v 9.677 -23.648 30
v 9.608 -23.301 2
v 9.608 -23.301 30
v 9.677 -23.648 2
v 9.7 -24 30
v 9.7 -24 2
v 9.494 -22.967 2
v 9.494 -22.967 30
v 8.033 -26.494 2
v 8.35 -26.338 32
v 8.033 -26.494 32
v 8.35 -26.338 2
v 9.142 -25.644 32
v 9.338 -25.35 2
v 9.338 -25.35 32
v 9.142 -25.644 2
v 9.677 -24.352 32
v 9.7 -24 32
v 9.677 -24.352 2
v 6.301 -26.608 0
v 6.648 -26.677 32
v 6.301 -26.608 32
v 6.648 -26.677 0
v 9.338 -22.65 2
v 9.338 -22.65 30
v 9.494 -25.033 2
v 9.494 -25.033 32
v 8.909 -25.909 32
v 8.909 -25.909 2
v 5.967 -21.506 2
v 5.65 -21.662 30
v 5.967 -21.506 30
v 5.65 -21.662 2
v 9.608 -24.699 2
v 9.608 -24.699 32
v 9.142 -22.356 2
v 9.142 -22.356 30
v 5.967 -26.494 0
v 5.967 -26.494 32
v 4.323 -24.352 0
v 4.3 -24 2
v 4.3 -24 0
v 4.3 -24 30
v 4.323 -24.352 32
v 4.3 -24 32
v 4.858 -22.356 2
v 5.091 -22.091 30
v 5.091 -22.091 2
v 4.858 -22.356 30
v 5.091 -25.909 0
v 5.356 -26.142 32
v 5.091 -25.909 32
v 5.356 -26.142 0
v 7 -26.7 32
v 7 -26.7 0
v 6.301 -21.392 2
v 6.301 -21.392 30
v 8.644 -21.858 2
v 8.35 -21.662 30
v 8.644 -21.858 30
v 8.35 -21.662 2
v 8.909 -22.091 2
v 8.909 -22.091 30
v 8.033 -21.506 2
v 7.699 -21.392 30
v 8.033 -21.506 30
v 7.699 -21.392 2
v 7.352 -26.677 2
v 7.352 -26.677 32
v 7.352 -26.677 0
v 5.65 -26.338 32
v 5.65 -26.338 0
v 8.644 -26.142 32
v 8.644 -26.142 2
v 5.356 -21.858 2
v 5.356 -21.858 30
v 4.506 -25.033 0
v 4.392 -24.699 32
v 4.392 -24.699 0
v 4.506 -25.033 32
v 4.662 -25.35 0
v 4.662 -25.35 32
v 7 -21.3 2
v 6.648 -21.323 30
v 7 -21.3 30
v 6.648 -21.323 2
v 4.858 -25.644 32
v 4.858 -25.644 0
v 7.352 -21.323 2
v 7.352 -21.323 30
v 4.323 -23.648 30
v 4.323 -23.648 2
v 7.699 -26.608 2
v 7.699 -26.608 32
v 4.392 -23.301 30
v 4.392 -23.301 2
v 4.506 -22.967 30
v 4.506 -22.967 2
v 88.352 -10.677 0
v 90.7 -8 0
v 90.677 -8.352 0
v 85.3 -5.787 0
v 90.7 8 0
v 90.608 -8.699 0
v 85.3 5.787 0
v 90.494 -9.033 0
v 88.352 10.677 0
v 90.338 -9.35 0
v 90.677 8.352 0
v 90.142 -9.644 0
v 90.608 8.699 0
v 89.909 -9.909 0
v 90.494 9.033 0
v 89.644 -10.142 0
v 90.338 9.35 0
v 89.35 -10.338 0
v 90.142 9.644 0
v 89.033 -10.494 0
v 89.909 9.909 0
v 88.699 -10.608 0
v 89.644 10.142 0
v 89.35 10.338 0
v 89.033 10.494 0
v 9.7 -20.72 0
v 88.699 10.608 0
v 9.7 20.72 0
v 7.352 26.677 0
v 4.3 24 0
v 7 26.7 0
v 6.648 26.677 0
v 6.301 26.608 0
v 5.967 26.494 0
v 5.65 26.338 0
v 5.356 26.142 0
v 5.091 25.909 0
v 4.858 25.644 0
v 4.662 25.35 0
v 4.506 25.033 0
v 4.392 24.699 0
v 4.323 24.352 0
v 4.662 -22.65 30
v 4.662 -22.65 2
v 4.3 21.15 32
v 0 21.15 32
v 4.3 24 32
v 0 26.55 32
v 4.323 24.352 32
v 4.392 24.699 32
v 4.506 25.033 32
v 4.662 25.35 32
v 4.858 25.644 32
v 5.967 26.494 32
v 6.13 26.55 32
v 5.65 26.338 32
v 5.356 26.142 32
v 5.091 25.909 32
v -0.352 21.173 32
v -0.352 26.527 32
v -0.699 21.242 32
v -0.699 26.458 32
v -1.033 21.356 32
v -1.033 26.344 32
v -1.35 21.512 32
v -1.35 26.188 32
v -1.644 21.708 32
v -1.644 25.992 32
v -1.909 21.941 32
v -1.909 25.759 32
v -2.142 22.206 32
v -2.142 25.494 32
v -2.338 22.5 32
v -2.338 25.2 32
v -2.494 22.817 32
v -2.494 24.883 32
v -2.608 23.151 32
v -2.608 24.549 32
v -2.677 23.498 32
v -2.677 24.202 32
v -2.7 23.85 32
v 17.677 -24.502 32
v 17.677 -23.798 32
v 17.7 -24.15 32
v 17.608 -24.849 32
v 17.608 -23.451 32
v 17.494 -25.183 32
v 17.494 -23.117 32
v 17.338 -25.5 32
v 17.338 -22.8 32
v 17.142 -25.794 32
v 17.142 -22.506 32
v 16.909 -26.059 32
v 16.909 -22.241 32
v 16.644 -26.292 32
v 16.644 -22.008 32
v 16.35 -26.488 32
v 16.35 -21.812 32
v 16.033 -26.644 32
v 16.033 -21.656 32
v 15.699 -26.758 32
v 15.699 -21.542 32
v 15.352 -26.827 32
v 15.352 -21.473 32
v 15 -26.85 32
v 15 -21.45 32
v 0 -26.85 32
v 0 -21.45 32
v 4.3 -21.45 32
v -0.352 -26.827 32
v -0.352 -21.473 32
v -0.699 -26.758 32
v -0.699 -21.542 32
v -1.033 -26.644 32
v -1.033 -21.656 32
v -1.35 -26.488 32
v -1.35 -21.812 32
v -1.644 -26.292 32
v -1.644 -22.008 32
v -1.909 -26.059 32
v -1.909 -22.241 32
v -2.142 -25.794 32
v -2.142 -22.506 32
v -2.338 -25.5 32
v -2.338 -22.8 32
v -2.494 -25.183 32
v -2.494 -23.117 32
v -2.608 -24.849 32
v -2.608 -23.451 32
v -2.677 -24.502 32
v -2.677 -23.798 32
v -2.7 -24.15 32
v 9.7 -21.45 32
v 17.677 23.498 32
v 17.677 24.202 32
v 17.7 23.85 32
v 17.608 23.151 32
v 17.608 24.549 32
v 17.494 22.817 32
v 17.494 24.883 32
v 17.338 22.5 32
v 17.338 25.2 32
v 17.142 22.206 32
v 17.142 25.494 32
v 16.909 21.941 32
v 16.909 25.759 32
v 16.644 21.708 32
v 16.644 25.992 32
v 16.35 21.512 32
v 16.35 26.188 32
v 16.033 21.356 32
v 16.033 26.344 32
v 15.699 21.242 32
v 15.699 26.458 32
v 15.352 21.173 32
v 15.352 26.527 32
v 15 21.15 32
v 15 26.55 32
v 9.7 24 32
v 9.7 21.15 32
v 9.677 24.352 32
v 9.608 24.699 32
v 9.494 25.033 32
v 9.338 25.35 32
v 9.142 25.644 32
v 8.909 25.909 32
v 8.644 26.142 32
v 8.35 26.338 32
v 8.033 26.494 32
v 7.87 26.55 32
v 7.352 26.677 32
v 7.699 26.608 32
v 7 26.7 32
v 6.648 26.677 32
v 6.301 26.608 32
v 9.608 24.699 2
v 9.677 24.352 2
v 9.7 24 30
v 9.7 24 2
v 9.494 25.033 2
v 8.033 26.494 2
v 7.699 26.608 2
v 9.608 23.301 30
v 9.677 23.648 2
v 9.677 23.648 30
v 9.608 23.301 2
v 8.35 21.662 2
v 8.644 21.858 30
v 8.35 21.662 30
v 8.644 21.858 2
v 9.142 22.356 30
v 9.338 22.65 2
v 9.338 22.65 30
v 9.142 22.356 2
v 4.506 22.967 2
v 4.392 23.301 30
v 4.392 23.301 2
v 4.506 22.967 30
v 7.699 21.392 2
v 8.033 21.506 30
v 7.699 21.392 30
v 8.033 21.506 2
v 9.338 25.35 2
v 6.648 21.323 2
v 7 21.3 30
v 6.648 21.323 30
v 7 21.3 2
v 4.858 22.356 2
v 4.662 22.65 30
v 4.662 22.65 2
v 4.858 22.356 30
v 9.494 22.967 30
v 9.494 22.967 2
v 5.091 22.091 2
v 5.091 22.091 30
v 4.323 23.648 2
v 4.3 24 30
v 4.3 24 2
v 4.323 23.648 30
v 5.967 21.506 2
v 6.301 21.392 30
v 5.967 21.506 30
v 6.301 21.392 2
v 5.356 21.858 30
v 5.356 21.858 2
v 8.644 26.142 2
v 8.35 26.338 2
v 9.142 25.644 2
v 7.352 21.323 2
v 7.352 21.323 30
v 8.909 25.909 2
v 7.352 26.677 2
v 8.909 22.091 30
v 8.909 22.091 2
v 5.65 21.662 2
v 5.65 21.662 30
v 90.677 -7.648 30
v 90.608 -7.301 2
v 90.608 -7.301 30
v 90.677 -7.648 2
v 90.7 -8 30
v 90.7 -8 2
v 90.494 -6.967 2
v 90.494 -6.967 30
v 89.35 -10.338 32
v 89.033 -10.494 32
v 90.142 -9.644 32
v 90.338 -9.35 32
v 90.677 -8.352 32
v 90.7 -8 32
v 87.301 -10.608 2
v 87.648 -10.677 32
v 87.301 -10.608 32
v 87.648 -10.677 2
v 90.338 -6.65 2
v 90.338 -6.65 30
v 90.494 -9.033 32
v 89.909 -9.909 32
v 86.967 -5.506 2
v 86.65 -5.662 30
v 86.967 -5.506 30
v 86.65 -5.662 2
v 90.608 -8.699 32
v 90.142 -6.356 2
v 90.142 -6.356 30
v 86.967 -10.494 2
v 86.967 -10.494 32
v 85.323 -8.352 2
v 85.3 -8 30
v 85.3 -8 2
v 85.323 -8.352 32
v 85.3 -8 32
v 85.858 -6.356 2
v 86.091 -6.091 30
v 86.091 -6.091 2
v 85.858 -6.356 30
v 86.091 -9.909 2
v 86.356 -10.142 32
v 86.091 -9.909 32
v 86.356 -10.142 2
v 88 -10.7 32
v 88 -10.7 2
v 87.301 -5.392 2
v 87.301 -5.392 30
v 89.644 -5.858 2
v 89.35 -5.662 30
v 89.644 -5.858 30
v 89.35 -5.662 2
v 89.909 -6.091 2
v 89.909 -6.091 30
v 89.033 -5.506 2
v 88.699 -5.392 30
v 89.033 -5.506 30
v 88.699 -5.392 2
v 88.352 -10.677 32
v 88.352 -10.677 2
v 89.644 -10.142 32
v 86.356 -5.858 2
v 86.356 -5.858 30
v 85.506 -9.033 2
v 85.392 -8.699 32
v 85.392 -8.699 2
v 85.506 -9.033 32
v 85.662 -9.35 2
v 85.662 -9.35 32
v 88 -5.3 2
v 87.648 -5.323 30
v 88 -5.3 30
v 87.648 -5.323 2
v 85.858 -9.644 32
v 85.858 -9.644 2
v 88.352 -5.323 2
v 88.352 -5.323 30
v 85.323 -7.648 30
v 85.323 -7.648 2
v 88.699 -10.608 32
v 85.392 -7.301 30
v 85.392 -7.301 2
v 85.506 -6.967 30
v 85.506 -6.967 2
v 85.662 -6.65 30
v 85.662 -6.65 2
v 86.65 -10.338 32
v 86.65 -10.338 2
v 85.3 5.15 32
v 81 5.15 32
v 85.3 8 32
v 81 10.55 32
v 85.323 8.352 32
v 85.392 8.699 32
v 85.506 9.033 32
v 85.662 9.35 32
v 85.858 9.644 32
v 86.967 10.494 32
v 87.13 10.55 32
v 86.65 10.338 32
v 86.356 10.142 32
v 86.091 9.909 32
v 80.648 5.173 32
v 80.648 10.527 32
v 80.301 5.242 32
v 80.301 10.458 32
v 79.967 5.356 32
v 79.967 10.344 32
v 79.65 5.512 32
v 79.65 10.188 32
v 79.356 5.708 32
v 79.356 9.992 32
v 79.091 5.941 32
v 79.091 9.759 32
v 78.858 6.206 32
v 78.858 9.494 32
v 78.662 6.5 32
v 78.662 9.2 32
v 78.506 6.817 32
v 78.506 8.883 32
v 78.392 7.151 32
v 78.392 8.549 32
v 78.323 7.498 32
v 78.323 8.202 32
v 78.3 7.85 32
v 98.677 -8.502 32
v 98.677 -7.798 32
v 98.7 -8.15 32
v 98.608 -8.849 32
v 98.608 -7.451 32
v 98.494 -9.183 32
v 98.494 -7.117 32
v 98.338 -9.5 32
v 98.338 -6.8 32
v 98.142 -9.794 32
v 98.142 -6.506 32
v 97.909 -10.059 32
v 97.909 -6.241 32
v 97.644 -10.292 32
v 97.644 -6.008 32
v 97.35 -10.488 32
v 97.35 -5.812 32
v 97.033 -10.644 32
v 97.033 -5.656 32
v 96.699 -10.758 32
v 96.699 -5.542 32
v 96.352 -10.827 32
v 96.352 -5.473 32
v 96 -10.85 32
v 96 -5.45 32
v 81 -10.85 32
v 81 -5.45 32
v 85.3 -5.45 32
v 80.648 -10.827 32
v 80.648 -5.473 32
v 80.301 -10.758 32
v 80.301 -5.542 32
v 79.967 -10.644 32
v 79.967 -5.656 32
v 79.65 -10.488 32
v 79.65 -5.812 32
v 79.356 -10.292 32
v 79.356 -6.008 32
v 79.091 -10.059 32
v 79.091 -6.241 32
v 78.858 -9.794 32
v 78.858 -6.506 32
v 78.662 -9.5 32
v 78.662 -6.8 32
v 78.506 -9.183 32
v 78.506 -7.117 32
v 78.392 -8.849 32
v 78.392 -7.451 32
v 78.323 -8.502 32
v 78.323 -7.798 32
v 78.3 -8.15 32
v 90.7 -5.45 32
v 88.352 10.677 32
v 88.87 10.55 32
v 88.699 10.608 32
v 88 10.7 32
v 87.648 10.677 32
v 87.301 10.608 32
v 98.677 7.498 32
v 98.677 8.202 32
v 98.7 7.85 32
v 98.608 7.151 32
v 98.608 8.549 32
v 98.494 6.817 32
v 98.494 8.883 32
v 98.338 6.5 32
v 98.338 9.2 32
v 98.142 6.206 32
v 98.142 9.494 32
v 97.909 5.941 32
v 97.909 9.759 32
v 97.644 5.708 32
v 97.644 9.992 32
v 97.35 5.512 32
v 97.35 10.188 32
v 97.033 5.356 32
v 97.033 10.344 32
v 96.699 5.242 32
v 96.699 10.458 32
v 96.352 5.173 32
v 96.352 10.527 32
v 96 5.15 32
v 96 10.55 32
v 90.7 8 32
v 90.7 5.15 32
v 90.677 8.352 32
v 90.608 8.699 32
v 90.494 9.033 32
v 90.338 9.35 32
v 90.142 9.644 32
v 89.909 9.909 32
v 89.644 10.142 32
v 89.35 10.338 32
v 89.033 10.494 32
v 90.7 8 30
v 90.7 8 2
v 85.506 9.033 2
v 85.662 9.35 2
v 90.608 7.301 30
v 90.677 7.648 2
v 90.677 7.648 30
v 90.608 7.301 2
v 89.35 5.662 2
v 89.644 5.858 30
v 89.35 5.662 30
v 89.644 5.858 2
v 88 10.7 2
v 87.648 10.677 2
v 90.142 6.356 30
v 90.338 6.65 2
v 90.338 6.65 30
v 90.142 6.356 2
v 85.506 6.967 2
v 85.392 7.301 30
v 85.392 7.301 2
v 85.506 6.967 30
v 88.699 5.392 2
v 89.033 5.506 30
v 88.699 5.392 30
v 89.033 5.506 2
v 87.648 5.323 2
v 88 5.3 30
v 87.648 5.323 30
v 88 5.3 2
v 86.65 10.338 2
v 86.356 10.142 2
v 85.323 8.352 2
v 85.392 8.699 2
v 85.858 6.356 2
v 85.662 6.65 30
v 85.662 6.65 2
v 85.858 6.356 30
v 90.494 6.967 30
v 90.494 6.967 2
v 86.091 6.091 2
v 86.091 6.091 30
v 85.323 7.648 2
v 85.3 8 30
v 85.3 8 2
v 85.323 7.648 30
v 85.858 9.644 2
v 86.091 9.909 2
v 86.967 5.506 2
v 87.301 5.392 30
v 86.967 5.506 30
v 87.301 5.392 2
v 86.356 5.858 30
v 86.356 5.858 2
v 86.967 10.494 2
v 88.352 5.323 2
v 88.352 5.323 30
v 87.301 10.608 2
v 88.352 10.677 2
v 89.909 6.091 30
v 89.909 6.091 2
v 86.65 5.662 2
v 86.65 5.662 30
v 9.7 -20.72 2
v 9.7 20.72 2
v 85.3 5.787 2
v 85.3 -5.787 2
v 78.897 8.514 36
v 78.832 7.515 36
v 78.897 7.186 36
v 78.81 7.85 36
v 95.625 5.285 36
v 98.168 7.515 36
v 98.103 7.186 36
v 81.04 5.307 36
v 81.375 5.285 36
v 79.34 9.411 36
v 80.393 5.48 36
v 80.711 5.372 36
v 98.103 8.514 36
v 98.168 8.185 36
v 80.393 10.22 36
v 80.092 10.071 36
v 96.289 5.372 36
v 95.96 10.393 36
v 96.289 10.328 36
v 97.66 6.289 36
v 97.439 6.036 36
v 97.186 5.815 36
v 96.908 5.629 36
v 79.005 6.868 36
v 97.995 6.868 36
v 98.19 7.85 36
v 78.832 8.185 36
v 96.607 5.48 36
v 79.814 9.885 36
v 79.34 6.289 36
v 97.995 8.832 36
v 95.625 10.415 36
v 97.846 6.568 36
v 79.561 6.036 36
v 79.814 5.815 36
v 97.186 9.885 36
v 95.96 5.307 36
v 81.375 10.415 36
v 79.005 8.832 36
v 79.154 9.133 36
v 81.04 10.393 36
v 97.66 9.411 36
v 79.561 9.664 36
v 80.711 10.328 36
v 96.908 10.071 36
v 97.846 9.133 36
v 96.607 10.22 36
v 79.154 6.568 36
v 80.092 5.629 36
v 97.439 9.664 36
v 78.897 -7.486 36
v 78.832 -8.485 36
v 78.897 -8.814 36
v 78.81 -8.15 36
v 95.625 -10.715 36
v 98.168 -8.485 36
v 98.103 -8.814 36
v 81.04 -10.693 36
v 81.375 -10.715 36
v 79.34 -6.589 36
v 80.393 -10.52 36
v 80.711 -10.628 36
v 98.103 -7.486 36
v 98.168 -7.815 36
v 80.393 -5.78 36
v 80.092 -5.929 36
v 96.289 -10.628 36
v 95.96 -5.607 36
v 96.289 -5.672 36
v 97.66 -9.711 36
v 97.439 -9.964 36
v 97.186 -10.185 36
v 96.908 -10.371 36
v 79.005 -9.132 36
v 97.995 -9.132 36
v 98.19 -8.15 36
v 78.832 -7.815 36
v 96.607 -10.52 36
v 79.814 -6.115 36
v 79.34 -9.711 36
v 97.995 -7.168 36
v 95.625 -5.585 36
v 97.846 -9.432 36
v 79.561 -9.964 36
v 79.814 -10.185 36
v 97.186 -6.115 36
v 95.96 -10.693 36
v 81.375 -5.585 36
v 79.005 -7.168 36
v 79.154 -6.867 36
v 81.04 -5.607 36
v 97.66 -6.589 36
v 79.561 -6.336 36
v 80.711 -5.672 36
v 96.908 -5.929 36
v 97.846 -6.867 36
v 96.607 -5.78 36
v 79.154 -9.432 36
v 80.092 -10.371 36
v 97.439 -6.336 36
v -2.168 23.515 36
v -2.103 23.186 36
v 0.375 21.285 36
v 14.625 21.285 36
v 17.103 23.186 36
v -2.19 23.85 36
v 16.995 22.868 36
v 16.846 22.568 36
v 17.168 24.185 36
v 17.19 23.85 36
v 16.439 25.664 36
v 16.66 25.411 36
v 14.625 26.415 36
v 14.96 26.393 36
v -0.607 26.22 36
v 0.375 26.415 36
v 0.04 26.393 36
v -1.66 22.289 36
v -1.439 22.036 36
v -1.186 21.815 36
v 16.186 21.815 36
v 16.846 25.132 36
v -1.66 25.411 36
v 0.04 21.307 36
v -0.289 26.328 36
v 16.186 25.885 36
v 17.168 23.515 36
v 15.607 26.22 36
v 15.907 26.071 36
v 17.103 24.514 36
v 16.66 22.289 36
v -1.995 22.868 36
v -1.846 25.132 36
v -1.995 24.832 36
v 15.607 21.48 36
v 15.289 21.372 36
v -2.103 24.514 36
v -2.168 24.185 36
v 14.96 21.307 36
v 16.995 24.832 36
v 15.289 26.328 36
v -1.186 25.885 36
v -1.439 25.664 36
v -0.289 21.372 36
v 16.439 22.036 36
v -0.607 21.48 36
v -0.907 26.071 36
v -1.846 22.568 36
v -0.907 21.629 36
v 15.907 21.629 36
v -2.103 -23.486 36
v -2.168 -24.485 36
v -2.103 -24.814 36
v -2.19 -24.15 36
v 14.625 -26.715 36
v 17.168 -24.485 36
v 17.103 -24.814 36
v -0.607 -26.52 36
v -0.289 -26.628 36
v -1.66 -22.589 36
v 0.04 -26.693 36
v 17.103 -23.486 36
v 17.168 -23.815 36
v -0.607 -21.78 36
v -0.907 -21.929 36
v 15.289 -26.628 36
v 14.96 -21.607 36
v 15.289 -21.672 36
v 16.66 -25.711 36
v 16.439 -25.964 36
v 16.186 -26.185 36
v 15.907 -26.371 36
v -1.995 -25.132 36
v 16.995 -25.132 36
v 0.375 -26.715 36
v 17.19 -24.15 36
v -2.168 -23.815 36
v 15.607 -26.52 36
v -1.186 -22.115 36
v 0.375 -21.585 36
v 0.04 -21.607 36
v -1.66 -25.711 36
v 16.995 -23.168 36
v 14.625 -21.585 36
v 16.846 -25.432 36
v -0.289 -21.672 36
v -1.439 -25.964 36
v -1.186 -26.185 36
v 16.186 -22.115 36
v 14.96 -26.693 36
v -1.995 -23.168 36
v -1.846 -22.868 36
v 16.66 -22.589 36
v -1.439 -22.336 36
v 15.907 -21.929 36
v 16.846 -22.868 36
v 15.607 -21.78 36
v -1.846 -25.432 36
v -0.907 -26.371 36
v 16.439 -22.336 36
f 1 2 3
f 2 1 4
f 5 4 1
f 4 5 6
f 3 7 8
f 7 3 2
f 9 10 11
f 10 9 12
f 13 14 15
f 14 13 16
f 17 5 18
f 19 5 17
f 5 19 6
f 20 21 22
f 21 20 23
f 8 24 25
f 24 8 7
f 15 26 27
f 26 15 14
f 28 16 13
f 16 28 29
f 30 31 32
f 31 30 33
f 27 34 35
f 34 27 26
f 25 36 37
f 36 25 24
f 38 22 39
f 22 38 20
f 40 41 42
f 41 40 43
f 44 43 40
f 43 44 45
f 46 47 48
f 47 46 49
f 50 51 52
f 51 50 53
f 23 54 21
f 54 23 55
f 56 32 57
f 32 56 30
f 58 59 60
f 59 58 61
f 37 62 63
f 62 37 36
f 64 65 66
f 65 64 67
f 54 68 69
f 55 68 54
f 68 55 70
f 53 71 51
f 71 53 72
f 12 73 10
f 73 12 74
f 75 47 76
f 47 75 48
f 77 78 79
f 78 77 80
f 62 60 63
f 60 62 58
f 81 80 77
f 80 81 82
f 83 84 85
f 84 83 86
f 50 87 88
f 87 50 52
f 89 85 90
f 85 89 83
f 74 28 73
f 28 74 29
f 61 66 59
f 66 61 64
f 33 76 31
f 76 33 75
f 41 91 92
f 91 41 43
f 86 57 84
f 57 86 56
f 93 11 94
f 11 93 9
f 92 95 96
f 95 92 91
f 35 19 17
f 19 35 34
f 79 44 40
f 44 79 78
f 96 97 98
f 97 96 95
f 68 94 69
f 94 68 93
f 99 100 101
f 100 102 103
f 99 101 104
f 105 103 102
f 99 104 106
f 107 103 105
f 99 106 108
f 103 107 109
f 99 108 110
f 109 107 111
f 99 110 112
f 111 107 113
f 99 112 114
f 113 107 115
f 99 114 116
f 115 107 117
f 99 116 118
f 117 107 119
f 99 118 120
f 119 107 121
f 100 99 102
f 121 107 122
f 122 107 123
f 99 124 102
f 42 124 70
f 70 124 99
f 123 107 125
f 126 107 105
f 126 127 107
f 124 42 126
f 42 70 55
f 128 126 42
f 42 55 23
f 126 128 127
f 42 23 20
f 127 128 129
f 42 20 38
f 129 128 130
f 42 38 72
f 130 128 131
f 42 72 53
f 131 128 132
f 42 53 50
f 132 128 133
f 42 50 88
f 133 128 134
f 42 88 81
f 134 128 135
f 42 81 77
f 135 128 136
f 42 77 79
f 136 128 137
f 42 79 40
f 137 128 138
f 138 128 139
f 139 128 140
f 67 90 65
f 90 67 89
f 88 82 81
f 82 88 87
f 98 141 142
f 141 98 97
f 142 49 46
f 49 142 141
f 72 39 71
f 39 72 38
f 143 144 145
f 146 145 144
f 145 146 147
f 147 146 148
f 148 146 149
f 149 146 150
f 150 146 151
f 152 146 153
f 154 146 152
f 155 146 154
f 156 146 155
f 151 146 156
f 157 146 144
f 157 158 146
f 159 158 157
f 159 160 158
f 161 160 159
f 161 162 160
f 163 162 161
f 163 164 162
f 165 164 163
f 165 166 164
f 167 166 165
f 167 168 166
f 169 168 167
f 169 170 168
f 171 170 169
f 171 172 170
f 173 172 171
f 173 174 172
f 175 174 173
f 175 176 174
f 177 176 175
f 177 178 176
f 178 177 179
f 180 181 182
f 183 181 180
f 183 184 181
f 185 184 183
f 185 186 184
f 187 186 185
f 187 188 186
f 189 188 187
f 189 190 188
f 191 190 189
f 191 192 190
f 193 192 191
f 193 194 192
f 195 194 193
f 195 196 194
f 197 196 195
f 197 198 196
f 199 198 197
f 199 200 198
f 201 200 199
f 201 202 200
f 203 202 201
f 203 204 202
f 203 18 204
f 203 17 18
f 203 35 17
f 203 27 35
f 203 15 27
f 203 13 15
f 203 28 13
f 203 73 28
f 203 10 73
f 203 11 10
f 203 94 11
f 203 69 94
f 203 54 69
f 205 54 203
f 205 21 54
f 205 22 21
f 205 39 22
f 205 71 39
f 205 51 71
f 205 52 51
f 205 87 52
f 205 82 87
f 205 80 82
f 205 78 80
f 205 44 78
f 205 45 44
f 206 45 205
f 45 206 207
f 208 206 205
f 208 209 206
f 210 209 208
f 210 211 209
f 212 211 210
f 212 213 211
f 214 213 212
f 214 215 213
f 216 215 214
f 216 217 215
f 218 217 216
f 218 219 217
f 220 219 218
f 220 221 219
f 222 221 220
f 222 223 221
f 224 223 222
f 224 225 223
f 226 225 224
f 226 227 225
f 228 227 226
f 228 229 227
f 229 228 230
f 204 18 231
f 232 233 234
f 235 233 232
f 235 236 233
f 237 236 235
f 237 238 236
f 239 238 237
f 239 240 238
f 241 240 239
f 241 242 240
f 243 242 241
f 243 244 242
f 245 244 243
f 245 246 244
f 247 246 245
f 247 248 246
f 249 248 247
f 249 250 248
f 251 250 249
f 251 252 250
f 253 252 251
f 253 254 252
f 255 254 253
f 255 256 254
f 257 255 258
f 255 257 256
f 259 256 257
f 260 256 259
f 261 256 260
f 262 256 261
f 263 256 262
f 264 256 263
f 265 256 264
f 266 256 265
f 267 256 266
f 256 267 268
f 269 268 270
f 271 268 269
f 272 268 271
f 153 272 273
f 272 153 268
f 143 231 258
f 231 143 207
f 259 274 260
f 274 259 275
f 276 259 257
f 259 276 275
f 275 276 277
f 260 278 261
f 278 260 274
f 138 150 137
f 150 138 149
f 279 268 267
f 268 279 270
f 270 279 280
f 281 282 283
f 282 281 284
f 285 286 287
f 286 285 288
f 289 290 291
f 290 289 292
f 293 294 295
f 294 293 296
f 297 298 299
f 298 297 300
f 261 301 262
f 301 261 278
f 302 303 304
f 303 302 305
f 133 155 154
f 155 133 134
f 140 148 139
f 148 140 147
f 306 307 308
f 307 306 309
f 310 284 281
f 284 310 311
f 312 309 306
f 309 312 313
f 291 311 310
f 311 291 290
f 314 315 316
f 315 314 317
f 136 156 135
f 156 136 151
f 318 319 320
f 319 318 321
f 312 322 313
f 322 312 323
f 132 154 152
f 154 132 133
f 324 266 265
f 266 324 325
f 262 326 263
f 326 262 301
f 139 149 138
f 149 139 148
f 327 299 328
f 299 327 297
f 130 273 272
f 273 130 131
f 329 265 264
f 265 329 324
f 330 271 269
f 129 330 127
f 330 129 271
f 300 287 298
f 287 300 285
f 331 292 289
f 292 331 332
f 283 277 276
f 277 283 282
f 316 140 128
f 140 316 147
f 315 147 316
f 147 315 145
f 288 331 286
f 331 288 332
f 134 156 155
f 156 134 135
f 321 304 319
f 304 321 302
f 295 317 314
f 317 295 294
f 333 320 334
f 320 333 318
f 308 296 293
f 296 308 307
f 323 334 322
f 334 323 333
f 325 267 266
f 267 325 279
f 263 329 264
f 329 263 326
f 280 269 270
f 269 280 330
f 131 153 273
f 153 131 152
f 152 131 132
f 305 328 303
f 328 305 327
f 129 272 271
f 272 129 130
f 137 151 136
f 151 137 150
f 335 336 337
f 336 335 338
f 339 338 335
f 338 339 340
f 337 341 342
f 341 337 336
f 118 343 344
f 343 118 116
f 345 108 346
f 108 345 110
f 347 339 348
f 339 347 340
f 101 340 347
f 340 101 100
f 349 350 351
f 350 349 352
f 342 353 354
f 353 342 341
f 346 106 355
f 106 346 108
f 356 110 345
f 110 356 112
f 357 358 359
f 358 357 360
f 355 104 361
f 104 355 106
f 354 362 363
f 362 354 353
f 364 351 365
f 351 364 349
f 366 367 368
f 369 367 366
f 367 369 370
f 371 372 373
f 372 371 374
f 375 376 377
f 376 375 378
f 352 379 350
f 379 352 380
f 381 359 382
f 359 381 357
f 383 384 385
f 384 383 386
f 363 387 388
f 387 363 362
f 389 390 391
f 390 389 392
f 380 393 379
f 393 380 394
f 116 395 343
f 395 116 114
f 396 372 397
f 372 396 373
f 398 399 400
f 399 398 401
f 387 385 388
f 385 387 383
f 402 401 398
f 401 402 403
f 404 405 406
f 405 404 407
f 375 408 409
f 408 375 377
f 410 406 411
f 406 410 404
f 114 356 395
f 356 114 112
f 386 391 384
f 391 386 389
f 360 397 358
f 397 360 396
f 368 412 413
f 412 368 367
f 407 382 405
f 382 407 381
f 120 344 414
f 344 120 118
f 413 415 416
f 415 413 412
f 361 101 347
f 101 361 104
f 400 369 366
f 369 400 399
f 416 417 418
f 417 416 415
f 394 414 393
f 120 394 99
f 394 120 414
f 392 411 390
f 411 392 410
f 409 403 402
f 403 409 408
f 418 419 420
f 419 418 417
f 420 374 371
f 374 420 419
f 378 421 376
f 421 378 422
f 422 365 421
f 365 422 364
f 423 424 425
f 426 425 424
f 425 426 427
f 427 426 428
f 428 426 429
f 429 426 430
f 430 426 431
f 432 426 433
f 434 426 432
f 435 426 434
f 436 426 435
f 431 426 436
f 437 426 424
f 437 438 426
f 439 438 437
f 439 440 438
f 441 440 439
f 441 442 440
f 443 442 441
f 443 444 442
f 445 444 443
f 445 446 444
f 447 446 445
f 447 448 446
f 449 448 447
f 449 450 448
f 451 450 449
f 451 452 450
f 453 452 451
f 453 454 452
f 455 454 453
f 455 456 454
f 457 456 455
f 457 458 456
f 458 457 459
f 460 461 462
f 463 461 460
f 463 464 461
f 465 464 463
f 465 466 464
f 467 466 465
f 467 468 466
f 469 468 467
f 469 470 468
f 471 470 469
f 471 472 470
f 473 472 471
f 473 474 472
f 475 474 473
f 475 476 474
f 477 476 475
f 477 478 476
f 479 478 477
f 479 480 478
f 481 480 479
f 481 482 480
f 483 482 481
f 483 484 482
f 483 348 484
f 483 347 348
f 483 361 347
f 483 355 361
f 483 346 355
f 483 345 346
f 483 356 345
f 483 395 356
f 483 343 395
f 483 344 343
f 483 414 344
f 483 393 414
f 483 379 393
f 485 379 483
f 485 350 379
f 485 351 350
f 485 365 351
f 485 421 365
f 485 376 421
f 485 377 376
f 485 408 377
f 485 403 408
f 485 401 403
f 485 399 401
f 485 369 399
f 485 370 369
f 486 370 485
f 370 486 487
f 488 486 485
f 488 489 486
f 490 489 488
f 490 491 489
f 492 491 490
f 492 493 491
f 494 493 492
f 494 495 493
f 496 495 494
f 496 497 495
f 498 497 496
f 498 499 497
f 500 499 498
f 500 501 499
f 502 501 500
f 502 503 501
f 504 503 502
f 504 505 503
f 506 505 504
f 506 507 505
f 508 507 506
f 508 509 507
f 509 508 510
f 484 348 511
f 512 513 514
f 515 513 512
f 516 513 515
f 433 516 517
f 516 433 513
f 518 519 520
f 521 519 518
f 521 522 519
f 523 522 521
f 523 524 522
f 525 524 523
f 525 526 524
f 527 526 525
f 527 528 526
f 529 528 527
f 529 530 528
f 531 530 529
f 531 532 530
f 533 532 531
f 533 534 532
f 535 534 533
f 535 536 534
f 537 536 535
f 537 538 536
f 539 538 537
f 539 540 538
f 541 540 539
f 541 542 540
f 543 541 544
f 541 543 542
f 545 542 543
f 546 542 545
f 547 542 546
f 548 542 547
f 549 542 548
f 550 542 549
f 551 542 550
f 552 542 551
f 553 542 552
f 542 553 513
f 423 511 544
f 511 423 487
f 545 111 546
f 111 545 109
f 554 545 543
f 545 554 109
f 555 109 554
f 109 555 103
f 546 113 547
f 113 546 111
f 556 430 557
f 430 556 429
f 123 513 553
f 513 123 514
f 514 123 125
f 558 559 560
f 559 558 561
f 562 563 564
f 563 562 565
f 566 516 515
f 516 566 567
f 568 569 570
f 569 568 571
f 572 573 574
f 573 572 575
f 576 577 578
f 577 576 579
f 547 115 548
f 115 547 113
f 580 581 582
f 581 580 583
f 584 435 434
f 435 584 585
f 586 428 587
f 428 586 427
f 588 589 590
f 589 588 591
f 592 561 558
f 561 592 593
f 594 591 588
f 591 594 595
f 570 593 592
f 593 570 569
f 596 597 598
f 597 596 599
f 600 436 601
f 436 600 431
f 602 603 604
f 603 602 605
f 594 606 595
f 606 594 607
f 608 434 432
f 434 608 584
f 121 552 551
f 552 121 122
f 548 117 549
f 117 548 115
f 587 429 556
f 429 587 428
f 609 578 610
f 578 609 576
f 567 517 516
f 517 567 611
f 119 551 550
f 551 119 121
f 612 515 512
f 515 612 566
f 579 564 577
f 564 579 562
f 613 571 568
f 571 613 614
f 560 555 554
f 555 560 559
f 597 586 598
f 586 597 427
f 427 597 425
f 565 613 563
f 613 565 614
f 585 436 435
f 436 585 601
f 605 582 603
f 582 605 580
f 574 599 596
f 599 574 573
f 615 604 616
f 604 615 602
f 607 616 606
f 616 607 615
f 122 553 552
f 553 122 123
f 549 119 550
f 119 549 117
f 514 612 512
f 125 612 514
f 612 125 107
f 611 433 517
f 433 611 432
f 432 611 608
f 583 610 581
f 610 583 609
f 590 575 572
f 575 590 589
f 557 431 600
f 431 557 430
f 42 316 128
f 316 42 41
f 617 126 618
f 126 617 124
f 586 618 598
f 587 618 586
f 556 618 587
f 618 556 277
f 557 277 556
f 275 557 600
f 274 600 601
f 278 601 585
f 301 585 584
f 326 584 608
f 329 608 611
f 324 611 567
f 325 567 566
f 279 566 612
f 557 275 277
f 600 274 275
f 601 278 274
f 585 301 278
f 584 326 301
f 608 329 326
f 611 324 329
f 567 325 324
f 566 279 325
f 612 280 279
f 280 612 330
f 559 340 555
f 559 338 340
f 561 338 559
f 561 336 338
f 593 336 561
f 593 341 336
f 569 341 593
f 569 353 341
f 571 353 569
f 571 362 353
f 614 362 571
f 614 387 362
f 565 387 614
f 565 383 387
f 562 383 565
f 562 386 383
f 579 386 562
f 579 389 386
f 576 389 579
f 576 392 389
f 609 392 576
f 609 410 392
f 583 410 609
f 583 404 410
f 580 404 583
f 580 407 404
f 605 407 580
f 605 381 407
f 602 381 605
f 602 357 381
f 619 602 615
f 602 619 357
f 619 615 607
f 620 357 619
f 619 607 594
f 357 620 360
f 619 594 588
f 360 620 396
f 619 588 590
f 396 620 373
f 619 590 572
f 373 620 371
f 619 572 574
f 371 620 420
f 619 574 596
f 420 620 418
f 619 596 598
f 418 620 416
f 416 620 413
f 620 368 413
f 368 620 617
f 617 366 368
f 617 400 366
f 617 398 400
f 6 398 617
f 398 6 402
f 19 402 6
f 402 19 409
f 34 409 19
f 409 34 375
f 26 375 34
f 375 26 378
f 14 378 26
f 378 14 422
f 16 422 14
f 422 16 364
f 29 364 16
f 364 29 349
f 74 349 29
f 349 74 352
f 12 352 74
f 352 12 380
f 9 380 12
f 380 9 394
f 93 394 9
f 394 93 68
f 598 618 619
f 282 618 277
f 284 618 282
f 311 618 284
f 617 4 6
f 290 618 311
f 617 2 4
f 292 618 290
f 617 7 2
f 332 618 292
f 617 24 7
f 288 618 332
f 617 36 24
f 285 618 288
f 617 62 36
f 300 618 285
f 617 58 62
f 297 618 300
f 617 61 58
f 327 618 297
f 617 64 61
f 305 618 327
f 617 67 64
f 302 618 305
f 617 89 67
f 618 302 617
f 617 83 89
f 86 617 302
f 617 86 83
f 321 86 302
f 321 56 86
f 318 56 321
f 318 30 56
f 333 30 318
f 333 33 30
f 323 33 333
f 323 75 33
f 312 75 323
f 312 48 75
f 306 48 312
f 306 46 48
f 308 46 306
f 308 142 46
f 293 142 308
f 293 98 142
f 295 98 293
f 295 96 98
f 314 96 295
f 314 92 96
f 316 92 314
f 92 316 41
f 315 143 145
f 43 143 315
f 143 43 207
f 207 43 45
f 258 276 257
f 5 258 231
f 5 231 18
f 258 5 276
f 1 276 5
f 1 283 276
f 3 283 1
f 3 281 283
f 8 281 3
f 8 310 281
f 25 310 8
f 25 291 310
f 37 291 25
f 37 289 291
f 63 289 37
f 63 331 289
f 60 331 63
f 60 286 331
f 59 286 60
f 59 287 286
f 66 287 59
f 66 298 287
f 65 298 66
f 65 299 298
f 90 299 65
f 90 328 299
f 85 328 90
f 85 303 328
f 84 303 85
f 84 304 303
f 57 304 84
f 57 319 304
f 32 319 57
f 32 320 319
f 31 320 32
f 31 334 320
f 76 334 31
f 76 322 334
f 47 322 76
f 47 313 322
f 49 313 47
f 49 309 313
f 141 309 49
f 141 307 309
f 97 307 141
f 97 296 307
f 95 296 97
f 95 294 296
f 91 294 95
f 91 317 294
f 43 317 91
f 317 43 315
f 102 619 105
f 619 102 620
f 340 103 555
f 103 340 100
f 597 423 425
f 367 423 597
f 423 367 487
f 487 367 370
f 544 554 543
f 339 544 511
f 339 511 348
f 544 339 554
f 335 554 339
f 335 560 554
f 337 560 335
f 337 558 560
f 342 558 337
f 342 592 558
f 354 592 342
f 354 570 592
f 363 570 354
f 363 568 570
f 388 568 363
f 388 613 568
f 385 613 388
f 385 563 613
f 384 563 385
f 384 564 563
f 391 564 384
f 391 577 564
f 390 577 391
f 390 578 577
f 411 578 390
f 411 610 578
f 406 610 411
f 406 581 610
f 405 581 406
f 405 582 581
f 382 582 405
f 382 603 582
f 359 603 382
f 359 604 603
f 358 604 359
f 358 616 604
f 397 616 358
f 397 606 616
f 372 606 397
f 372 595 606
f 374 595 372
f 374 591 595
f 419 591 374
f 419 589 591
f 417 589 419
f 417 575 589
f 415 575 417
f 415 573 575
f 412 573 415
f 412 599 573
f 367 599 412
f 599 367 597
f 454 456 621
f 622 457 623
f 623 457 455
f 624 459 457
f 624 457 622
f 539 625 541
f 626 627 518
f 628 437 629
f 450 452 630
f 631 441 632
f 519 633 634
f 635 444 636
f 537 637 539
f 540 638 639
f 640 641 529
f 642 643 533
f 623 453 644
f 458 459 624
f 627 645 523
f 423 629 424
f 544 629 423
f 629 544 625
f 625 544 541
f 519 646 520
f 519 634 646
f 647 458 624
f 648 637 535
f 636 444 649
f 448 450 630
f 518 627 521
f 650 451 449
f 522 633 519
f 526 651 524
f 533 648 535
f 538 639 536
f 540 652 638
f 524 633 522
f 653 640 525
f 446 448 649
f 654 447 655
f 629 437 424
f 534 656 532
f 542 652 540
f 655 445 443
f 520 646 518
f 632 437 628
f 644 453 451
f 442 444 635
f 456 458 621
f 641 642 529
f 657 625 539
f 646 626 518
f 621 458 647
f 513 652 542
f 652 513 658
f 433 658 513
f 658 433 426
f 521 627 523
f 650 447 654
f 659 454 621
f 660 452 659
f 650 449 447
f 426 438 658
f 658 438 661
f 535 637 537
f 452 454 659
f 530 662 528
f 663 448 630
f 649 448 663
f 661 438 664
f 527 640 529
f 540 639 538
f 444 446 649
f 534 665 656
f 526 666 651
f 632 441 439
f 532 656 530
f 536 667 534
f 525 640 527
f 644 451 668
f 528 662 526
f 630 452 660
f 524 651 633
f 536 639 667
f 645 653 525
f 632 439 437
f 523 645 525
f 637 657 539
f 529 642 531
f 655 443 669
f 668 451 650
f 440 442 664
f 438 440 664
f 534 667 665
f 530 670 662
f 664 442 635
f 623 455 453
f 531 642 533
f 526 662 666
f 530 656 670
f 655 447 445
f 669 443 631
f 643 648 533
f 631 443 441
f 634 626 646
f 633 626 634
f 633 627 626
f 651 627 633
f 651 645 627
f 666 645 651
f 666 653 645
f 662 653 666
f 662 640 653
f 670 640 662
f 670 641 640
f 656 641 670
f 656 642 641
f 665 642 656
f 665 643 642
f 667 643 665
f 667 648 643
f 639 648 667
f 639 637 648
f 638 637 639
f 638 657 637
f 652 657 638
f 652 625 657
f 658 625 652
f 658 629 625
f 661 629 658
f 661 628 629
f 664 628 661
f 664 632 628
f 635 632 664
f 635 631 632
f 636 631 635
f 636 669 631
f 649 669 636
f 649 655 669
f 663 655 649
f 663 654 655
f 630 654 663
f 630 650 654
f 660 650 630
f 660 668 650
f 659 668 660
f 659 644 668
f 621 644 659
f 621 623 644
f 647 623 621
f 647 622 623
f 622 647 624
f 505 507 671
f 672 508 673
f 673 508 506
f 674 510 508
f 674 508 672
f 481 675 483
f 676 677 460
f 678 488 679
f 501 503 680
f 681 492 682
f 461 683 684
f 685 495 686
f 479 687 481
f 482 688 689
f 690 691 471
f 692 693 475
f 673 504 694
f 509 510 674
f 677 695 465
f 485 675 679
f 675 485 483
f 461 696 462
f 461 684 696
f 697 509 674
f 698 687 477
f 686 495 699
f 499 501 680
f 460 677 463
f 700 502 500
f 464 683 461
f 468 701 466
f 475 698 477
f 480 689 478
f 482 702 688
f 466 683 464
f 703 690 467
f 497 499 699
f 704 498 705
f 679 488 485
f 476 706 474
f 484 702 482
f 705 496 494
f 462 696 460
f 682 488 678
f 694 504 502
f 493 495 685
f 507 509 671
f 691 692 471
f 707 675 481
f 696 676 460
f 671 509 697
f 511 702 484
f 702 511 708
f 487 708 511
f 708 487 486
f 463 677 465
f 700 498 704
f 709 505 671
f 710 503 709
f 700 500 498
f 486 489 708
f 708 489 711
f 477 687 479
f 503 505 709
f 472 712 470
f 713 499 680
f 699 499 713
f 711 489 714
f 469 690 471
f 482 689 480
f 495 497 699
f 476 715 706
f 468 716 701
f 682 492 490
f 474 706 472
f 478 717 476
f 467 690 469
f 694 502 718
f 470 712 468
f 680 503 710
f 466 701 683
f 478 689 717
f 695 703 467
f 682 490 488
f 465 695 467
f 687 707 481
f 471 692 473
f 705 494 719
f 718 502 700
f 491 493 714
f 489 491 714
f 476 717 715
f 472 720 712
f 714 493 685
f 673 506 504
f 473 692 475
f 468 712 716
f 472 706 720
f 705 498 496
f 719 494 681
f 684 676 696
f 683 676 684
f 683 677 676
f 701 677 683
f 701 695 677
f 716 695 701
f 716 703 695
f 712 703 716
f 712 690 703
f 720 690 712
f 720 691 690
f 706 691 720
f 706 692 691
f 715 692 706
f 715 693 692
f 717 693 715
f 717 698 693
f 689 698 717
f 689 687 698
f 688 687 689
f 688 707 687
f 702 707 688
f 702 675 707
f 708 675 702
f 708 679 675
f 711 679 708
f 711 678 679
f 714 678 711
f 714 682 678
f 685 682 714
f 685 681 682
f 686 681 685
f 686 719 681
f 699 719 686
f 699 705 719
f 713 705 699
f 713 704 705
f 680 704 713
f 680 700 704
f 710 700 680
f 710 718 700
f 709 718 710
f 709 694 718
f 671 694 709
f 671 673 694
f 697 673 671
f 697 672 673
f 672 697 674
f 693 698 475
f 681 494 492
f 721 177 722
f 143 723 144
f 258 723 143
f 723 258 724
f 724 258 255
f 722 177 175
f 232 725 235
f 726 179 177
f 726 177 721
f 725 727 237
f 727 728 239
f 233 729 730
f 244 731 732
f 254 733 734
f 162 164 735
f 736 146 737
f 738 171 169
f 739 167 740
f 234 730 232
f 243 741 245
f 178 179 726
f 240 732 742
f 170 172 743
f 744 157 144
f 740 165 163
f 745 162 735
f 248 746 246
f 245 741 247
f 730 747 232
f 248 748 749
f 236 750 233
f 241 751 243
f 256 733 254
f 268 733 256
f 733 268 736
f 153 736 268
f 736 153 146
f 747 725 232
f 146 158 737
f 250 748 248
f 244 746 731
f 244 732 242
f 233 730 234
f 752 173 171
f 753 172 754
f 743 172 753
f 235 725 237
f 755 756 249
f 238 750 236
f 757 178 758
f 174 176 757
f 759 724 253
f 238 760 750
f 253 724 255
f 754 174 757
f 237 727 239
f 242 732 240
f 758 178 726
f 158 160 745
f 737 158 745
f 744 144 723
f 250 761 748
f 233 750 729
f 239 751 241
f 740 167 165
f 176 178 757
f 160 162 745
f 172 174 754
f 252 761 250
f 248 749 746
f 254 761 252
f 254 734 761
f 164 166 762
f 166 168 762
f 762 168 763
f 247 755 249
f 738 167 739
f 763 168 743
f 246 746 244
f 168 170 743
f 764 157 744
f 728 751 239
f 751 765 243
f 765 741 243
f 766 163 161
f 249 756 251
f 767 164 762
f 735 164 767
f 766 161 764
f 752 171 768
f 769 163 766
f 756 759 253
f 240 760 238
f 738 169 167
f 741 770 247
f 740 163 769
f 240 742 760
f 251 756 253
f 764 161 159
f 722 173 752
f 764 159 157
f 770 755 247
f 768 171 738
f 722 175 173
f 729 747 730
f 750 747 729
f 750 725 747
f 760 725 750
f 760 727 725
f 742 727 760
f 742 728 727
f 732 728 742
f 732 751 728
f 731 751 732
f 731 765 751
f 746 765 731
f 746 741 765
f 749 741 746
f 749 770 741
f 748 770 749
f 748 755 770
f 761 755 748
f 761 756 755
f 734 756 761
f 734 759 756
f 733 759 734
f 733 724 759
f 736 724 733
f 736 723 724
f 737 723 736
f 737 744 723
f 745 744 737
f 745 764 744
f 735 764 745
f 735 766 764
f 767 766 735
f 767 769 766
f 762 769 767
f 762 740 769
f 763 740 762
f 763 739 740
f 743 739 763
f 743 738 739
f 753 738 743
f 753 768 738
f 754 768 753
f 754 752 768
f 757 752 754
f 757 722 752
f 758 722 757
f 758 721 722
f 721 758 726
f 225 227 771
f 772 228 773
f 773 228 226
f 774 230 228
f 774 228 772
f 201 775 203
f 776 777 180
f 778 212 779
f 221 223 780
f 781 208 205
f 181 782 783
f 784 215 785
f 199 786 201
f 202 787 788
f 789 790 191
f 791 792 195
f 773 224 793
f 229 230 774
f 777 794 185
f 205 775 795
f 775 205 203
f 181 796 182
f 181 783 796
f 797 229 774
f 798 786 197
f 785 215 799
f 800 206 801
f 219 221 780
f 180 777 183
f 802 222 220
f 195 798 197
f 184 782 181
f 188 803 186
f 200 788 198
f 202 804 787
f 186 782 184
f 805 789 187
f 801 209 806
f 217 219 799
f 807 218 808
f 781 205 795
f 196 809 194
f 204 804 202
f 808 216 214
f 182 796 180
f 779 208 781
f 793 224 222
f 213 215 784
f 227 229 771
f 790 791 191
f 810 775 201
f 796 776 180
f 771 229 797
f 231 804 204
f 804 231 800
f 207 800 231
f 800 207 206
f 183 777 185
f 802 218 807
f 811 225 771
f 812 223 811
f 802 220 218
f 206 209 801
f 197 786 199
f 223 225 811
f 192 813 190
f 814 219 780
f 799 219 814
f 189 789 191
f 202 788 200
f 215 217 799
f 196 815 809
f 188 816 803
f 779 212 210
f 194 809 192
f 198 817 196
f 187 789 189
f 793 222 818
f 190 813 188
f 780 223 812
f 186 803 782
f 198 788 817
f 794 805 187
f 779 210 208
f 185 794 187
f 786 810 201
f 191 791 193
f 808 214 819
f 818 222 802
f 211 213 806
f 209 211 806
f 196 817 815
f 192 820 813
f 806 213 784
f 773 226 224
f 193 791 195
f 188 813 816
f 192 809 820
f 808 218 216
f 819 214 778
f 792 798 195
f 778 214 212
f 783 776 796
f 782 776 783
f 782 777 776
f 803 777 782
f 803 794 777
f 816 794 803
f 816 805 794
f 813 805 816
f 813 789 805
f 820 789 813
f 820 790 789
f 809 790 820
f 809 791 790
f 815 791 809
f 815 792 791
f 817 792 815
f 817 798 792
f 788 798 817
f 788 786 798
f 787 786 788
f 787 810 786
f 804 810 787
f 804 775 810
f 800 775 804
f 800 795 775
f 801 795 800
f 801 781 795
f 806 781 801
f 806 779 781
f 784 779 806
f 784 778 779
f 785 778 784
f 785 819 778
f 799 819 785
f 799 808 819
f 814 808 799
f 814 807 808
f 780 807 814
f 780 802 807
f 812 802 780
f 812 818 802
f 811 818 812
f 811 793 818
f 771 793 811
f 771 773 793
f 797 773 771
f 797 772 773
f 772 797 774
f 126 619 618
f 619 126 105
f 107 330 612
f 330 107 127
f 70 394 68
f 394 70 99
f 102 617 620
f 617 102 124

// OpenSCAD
$fn = 48;

points = [
  [7,-24,0],
  [7,24,0],
  [27*3 + 7,-8,0],
  [27*3 + 7,8,0]
];

for (point = points) {
  echo(point);
  translate(point)
  cylinder(r=2.7,h=32);
}

connector(points[0], points[1], 1);
connector(points[1], points[3], 0);
connector(points[0], points[2], 0);
connector(points[3], points[2], 1);

module connector(p1,p2,l) {
  for (t = [0:l])
  translate([0,0,30*t])
  hull() {
    translate(p1)
    cylinder(r=2.7,h=2);
    translate(p2)
    cylinder(r=2.7,h=2);
  }
}

tabs();

module tabs() {
  slotWidth = 5.4;
  slotOffset = 15;
  slotLength = slotOffset + slotWidth;

  translate([0,0,32])
  rotate([180,0,0])
  translate([0,-1.5*slotOffset-slotWidth/4,0]) {
    
    translate([27*3,16,0])
    slot();
    translate([27*3,32,0])
    slot();
    translate([0,0,0])
    slot();
    translate([0,48,0])
    slot();
    
    
  }
  module slot() {
    rotate([180,0,0])
    translate([slotOffset/2,0,0])
    linear_extrude(4,scale=.95)
    translate([-slotOffset/2,0,0])
    hull() {
      translate([slotOffset,0])
      circle(slotWidth/2);
      circle(slotWidth/2);
    }
  }
}
